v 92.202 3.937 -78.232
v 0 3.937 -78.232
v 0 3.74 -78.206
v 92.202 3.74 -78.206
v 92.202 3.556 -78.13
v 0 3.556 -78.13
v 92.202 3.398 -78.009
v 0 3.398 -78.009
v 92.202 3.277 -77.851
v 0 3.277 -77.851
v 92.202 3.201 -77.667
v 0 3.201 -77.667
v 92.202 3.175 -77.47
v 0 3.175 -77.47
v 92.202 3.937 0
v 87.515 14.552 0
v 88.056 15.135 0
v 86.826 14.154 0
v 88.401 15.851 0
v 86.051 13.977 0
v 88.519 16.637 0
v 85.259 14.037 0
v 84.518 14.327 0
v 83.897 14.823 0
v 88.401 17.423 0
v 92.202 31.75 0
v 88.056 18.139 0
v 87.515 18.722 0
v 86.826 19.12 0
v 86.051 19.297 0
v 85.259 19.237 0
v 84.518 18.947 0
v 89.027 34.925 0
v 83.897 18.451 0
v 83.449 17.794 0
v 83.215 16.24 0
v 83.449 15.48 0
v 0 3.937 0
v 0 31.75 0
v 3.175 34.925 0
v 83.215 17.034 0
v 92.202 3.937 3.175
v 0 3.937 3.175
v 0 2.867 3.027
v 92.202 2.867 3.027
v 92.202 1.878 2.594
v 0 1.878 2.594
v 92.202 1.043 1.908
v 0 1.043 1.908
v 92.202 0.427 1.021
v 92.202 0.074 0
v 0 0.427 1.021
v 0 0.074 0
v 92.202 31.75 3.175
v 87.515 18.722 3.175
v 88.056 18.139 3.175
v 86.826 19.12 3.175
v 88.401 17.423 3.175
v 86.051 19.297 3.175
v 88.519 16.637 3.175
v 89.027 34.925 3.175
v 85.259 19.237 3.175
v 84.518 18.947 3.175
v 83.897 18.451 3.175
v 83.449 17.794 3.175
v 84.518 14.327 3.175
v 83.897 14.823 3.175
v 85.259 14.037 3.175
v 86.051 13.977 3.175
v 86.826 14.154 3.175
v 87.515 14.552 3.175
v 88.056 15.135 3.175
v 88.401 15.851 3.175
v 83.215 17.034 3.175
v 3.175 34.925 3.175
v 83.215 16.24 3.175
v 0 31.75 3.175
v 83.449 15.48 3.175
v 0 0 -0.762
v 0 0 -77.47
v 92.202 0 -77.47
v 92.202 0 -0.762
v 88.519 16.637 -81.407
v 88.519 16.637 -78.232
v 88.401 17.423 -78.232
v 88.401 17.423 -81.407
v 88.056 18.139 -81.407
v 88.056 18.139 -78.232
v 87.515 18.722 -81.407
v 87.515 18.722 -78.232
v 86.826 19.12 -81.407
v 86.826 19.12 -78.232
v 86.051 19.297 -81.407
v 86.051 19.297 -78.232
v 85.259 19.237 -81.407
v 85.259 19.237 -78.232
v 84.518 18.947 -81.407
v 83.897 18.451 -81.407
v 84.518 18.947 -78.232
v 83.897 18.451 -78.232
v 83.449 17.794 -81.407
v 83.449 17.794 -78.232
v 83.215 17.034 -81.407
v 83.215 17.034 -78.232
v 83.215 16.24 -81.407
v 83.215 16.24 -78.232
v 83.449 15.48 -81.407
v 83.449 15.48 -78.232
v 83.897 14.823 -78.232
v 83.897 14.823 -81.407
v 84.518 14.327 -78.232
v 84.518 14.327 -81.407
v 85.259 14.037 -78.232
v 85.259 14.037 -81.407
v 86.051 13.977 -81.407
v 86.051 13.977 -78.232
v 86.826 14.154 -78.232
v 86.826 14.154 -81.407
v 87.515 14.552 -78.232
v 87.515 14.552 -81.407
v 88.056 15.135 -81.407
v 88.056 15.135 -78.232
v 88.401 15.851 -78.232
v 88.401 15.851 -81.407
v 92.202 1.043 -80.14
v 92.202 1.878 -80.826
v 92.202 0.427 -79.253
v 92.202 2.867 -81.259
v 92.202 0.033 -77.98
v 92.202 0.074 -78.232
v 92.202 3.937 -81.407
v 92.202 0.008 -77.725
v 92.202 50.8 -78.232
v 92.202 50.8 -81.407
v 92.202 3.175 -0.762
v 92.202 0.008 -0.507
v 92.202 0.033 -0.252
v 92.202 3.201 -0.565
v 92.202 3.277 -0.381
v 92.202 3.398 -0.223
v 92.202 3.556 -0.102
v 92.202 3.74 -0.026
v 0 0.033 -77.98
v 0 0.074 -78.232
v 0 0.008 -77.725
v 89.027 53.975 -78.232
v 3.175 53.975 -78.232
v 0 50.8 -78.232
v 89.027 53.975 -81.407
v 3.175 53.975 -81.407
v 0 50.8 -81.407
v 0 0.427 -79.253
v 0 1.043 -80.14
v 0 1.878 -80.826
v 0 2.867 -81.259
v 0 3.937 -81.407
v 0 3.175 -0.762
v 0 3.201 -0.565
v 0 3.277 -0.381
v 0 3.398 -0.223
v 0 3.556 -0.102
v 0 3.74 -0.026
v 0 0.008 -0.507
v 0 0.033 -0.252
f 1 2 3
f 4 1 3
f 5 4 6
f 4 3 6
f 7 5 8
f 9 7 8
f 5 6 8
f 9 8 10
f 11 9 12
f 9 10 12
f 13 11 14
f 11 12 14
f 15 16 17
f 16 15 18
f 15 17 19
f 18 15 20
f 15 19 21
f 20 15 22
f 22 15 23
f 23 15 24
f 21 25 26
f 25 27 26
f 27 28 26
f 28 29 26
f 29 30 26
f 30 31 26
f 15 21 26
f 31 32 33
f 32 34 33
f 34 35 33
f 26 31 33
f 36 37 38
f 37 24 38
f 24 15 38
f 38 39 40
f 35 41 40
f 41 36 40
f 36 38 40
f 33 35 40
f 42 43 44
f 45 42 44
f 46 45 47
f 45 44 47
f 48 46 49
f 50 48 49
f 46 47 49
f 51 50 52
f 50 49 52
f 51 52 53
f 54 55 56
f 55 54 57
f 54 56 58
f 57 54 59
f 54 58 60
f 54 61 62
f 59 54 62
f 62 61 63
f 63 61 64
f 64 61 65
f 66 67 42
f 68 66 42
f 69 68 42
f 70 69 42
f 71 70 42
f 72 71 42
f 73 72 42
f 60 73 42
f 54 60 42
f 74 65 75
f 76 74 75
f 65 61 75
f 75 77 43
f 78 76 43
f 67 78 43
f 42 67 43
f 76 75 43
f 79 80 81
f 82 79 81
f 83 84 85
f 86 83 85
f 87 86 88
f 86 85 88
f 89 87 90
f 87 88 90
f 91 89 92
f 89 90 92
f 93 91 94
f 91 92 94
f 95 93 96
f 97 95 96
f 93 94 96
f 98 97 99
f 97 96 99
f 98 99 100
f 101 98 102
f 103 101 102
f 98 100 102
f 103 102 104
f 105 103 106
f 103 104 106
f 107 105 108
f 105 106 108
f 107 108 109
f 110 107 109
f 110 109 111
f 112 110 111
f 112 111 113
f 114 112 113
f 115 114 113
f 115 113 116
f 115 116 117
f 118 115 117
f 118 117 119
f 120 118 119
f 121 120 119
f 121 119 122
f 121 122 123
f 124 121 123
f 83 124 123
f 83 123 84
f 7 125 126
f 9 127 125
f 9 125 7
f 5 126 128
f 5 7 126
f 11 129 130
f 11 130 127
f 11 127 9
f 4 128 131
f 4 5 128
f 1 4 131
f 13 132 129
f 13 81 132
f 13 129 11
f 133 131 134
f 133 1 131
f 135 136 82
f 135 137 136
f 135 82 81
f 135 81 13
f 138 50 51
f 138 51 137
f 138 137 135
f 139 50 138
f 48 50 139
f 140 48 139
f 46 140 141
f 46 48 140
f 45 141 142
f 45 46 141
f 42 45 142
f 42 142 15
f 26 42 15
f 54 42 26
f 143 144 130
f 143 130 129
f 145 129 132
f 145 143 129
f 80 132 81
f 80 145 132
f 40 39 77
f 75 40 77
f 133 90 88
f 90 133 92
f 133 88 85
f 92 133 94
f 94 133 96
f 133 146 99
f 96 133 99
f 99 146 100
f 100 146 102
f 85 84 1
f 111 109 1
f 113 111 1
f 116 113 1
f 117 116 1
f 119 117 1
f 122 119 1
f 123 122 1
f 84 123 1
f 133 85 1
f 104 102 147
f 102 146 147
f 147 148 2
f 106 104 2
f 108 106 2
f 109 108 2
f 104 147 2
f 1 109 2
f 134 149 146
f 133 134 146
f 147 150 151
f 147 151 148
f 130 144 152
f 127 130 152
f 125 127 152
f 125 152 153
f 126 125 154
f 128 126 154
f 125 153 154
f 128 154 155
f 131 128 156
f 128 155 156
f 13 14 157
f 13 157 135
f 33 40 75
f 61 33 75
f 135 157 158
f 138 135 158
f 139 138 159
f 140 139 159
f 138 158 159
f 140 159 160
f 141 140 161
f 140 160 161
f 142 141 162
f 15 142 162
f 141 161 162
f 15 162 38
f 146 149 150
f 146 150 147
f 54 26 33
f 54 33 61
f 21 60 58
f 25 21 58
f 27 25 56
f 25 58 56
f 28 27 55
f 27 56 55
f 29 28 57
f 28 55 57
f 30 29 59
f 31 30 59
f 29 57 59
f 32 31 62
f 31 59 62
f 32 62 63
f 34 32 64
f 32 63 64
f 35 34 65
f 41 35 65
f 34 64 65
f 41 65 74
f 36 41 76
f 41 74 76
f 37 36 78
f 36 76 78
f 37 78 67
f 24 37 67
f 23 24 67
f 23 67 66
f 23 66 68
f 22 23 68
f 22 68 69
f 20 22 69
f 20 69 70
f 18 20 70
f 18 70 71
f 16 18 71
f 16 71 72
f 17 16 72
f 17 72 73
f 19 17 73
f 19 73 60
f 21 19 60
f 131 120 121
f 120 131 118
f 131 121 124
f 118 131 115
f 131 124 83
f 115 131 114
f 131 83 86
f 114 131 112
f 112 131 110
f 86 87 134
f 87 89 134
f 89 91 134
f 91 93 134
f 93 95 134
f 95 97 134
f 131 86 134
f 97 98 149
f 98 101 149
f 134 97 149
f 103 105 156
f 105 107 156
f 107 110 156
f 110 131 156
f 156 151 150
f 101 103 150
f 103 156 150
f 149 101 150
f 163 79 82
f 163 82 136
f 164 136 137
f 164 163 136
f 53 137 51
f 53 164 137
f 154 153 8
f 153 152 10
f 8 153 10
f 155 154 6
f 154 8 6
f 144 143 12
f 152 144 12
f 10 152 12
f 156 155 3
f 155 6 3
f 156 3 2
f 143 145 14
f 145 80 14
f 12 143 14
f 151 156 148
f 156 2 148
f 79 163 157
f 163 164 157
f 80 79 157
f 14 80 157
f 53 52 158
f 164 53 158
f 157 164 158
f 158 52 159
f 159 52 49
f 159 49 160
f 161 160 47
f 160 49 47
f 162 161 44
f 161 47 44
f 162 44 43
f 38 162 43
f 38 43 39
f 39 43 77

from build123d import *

# Parameters (mm, degrees)
SKETCH1_W            = 92.202
SKETCH1_H            = 78.232
BOSS_EXTRUDE1_DEPTH  = 3.175
EDGE_FLANGE1_DEPTH   = 92.202
EDGE_FLANGE1_2_DEPTH = 92.202
EDGE_FLANGE2_DEPTH   = 92.202
EDGE_FLANGE2_2_DEPTH = 92.202
SKETCH9_R            = 2.667
CUT_EXTRUDE1_DEPTH   = 137.266738983
CHAMFER1_SIZE        = 3.175


# Read off the part's stored shape, not the designer's step: Edge-Flange1, Edge-Flange2
with BuildPart() as part:
    # Sketch1 → Boss-Extrude1 (new body)
    with BuildSketch(Plane(origin=(0, 0, 0), x_dir=(1, 0, 0), z_dir=(0, 1, 0))):
        with Locations((46.101, 39.116)):
            Rectangle(SKETCH1_W, SKETCH1_H)
    extrude(amount=BOSS_EXTRUDE1_DEPTH)

    # Edge-Flange1 outline → Edge-Flange1 (cut)
    with BuildSketch(Plane.YZ):
        with BuildLine():
            Line((0, -78.232), (0.074445793, -78.232))
            ThreePointArc((0.074445793, -78.232), (0.018655648, -77.852813981), (0, -77.47))
            Line((0, -77.47), (0, -78.232))
        make_face()
    extrude(amount=EDGE_FLANGE1_DEPTH, mode=Mode.SUBTRACT)

    # Edge-Flange1 2 outline → Edge-Flange1 2 (add)
    with BuildSketch(Plane.YZ):
        with BuildLine():
            ThreePointArc((0.074445793, -78.232), (1.4370025, -80.511378224), (3.937, -81.407))
            Line((3.937, -81.407), (53.975, -81.407))
            Line((53.975, -81.407), (53.975, -78.232))
            Line((53.975, -78.232), (3.937, -78.232))
            ThreePointArc((3.937, -78.232), (3.398184633, -78.008815367), (3.175, -77.47))
            Line((3.175, -77.47), (3.175, -78.232))
            Line((3.175, -78.232), (0.074445793, -78.232))
        make_face()
    extrude(amount=EDGE_FLANGE1_2_DEPTH)

    # Edge-Flange2 outline → Edge-Flange2 (cut)
    with BuildSketch(Plane.YZ):
        with BuildLine():
            ThreePointArc((0, -0.762), (0.018655648, -0.379186019), (0.074445793, 0))
            Line((0.074445793, 0), (0, 0))
            Line((0, 0), (0, -0.762))
        make_face()
    extrude(amount=EDGE_FLANGE2_DEPTH, mode=Mode.SUBTRACT)

    # Edge-Flange2 2 outline → Edge-Flange2 2 (add)
    with BuildSketch(Plane.YZ):
        with BuildLine():
            Line((34.925, 3.175), (3.937, 3.175))
            ThreePointArc((3.937, 3.175), (1.4370025, 2.279378224), (0.074445793, 0))
            Line((0.074445793, 0), (3.175, 0))
            Line((3.175, 0), (3.175, -0.762))
            ThreePointArc((3.175, -0.762), (3.398184633, -0.223184633), (3.937, 0))
            Line((3.937, 0), (34.925, 0))
            Line((34.925, 0), (34.925, 3.175))
        make_face()
    extrude(amount=EDGE_FLANGE2_2_DEPTH)

    # Sketch9 → Cut-Extrude1 (cut, through all)
    with BuildSketch(Plane.XY.offset(3.175)):
        with Locations((85.852, 16.637)):
            Circle(SKETCH9_R)
    extrude(amount=-CUT_EXTRUDE1_DEPTH, mode=Mode.SUBTRACT)

    # Chamfer1
    chamfer1_edges = [part.edges().sort_by_distance(p)[0] for p in [
        (92.202, 53.975, -79.8195),
        (0, 53.975, -79.8195),
        (0, 34.925, 1.5875),
        (92.202, 34.925, 1.5875),
    ]]
    chamfer(chamfer1_edges, length=CHAMFER1_SIZE)


solid = part.part
